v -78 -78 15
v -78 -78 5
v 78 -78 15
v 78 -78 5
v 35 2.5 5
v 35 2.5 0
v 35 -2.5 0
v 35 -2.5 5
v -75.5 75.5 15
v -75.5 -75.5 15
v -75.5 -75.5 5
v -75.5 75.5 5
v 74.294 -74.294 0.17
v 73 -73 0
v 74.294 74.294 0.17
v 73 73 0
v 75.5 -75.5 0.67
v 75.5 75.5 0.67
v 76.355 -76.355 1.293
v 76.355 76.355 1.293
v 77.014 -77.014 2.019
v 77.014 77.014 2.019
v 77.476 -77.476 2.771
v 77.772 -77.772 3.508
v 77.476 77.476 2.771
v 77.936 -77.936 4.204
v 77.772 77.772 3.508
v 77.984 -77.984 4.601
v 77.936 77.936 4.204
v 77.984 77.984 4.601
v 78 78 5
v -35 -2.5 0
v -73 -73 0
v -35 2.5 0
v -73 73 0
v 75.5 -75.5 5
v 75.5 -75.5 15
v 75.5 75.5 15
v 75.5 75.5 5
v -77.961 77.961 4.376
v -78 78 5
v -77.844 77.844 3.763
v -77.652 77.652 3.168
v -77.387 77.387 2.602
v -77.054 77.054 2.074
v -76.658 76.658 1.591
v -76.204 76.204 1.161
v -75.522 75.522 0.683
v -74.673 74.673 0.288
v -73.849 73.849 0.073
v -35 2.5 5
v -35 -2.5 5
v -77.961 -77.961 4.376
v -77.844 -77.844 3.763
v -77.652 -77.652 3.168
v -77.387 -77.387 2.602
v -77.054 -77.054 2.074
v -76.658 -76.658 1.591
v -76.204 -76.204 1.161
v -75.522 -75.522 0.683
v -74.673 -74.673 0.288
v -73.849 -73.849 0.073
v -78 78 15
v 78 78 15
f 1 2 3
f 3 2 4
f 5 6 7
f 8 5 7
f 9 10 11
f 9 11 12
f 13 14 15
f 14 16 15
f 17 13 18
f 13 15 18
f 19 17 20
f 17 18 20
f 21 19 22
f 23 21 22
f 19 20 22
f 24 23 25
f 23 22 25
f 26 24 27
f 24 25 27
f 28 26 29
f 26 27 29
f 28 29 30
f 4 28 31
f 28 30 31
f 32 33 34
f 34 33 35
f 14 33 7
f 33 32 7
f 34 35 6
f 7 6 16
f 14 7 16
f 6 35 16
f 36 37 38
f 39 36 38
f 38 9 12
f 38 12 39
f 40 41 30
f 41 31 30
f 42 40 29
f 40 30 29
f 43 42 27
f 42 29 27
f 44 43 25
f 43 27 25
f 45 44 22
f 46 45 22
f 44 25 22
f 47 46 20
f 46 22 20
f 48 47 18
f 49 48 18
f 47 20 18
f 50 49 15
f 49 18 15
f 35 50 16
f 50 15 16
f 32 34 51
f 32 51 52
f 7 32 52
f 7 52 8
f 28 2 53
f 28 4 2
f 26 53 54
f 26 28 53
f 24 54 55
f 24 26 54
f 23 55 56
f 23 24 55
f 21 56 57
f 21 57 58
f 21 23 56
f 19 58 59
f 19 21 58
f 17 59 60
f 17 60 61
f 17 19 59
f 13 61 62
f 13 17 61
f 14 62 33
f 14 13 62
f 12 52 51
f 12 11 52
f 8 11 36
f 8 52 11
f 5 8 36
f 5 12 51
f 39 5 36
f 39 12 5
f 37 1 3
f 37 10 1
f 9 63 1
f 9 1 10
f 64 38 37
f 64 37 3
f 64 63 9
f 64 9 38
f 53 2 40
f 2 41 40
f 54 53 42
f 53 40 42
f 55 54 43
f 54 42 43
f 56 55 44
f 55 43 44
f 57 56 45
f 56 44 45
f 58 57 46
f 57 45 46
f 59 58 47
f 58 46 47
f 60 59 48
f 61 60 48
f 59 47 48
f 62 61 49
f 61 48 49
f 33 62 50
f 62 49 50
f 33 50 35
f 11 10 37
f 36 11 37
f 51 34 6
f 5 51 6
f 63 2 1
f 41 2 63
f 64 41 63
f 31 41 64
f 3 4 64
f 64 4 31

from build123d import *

# Parameters (mm, degrees)
F0_W     = 156
F0_H     = 156
F1_DEPTH = 15
F2_W     = 151
F2_H     = 151
F3_DEPTH = 10
F4_R     = 5
F5_W     = 70
F5_H     = 5
F6_DEPTH = 5


with BuildPart() as f1:
    # F0 (on Top) → F1 (new body)
    with BuildSketch(Plane.XY):
        Rectangle(F0_W, F0_H)
    extrude(amount=F1_DEPTH)

    # F2 (on face) → F3 (cut)
    with BuildSketch(Plane.XY.offset(15)):
        Rectangle(F2_W, F2_H)
    extrude(amount=-F3_DEPTH, mode=Mode.SUBTRACT)

    # F4
    f4_edges = [f1.edges().sort_by_distance(p)[0] for p in [
        (78, 0, 0),
        (0, -78, 0),
        (-78, 0, 0),
        (0, 78, 0),
    ]]
    fillet(f4_edges, radius=F4_R)

    # F5 (on face) → F6 (cut)
    with BuildSketch(Plane(origin=(0, 0, 0), x_dir=(1, 0, 0), z_dir=(0, 0, -1))):
        Rectangle(F5_W, F5_H)
    extrude(amount=-F6_DEPTH, mode=Mode.SUBTRACT)


solid = f1.part
